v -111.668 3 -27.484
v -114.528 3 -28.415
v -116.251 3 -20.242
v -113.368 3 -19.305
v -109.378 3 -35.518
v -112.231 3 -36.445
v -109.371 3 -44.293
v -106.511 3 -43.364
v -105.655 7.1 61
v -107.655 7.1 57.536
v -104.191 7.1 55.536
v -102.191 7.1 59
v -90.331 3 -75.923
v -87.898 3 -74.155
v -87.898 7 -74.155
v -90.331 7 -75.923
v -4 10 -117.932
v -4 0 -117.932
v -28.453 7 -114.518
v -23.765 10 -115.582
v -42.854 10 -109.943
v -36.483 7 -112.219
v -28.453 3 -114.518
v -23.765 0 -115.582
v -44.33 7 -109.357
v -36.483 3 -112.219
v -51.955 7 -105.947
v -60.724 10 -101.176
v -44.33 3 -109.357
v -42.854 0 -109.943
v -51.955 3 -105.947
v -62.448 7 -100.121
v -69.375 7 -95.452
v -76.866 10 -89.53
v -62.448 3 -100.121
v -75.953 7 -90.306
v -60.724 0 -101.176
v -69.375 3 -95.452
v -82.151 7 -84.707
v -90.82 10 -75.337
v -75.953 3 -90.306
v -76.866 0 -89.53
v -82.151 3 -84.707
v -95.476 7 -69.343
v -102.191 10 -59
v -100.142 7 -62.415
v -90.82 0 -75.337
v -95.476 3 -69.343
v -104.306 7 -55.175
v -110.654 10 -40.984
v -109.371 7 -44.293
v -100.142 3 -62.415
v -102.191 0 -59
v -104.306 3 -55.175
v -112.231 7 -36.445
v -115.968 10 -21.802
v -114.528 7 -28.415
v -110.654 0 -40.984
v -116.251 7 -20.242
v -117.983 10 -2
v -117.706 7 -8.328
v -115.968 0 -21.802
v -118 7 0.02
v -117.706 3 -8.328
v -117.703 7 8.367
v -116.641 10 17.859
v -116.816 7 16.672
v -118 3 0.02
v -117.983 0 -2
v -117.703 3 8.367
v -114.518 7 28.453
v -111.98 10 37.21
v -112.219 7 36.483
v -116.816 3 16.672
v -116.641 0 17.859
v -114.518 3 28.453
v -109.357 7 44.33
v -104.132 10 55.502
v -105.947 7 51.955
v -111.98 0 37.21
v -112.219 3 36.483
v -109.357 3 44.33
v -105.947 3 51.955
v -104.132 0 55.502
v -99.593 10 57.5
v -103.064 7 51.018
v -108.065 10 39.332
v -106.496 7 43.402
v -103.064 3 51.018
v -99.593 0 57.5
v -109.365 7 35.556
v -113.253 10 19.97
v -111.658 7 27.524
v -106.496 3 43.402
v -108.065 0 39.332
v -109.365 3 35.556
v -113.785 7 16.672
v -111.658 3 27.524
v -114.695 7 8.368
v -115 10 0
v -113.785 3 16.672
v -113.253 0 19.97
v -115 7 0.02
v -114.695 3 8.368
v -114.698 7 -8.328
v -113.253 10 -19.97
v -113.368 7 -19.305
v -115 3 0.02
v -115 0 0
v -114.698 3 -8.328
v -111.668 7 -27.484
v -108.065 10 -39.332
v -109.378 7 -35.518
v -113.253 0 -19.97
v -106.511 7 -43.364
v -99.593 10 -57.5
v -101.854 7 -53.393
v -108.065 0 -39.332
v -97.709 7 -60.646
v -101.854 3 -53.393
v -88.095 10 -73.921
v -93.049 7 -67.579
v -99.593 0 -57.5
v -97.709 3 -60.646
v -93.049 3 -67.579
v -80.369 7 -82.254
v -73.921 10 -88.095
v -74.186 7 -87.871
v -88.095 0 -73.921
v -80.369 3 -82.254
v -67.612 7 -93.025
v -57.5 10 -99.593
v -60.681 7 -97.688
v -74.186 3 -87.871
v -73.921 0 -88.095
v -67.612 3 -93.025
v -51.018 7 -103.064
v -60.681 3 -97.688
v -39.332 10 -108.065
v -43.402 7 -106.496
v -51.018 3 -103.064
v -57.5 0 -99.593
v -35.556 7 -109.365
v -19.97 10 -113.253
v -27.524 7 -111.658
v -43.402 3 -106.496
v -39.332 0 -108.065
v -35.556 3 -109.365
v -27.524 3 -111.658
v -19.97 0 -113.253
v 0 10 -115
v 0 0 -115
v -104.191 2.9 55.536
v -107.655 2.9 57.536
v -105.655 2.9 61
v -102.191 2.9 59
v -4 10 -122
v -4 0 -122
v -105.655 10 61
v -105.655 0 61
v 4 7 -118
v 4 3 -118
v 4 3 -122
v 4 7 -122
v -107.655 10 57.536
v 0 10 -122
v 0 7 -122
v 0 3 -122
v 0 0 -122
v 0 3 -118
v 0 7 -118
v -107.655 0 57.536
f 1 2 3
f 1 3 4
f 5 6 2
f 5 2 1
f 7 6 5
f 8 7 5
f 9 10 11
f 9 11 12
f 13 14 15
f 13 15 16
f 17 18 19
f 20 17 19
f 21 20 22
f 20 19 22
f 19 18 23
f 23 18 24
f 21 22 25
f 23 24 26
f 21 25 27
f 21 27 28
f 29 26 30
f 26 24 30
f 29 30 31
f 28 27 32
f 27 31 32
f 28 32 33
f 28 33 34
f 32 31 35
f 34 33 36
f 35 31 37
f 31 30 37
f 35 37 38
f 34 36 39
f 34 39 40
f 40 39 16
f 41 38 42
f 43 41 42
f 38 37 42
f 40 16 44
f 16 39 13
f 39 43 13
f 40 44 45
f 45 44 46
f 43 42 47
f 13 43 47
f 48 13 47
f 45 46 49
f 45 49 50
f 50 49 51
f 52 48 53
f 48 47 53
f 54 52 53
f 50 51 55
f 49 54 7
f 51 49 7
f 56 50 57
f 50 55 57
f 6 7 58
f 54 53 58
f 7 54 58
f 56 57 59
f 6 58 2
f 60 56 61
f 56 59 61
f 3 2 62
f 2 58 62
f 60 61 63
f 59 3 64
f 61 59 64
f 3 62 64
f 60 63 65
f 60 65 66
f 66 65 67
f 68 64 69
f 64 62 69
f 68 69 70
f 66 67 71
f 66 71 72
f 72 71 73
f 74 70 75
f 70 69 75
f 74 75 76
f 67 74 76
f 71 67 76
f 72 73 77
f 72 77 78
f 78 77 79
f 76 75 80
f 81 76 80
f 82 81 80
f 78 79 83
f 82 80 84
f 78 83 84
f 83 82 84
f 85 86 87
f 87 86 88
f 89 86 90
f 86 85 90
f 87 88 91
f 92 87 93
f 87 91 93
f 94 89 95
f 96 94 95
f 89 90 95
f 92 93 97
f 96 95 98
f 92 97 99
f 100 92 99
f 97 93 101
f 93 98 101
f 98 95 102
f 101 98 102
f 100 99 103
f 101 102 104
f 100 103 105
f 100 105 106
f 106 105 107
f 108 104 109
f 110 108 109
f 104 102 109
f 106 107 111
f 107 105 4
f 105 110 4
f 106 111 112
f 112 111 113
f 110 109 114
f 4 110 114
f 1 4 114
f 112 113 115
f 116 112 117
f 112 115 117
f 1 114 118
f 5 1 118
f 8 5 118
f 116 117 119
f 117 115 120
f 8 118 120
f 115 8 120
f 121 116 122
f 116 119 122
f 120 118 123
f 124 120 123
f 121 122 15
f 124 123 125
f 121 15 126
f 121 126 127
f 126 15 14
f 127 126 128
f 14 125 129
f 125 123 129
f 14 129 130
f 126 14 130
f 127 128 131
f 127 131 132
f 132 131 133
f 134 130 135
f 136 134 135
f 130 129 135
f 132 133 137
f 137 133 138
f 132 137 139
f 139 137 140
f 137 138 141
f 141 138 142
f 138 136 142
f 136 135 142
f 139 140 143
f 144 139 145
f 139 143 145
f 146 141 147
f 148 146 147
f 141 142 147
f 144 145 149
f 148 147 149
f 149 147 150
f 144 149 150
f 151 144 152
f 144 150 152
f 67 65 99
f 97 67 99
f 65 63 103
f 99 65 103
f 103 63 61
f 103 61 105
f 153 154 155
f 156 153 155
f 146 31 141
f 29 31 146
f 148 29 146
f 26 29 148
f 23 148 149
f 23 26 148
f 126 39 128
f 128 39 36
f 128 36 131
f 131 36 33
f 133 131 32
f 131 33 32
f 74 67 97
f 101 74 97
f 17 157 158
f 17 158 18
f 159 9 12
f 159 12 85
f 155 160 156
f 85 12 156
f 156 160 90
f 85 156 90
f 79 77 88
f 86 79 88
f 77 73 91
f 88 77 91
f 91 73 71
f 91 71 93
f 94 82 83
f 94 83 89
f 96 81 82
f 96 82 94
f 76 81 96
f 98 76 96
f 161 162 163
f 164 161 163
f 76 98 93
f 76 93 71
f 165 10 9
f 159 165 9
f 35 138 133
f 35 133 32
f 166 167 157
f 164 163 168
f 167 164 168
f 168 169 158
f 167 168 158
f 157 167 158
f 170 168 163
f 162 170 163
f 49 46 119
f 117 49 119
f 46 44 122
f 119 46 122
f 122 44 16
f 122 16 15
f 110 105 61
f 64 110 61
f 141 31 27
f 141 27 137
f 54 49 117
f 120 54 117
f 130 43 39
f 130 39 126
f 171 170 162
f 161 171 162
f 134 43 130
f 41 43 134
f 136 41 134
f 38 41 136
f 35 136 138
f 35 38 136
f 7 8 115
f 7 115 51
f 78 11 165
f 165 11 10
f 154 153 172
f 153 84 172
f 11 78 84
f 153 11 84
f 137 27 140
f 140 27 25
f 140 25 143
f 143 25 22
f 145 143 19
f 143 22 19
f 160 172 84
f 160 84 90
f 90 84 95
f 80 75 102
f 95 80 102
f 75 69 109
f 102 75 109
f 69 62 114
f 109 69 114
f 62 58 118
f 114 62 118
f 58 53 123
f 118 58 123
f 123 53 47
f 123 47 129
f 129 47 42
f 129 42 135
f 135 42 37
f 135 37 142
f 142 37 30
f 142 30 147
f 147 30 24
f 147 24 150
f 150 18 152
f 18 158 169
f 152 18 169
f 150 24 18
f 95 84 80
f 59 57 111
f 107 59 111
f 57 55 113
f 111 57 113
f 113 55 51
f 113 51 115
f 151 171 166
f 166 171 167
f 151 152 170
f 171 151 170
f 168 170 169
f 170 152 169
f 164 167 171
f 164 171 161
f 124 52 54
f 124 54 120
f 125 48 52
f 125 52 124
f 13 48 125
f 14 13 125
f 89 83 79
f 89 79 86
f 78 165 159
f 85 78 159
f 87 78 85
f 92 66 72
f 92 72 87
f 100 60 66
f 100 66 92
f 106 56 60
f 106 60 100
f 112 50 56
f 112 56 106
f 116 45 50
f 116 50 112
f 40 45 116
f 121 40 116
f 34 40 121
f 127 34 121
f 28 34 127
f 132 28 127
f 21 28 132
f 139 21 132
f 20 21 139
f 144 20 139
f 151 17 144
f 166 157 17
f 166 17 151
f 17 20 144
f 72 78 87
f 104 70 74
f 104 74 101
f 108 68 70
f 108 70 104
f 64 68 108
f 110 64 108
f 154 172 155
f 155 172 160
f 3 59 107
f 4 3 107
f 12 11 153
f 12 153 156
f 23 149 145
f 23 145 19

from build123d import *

# Parameters (mm, degrees)
BOSS_EXTRUDE1_DEPTH     = 10
SKETCH2_W               = 8
SKETCH2_H               = 4.2
CUT_EXTRUDE1_DEPTH      = 4
CIRPATTERN4_START       = 3
CIRPATTERN4_DEPTH       = 4
CIRPATTERN4_2_OUTLINE_W = 4
CIRPATTERN4_2_OUTLINE_H = 4
CIRPATTERN4_2_DEPTH     = 4


# Read off the part's stored shape, not the designer's step: CirPattern4
with BuildPart() as part:
    # Sketch1 → Boss-Extrude1 (new body)
    with BuildSketch(Plane(origin=(0, 0, 0), x_dir=(1, 0, 0), z_dir=(0, 1, 0))):
        with BuildLine():
            Line((-4, 122), (-4, 117.932183902))
            ThreePointArc((-4, 117.932183902), (-102.190997647, 59), (-104.132267183, -55.501990336))
            Line((-104.132267183, -55.501990336), (-107.655099262, -57.535898385))
            Line((-107.655099262, -57.535898385), (-105.655099262, -61))
            Line((-105.655099262, -61), (-99.592921435, -57.5))
            ThreePointArc((-99.592921435, -57.5), (-99.592921435, 57.5), (0, 115))
            Line((0, 115), (0, 122))
            Line((0, 122), (-4, 122))
        make_face()
    extrude(amount=BOSS_EXTRUDE1_DEPTH)

    # Sketch2 → Cut-Extrude1 (cut)
    with BuildSketch(Plane(origin=(-105.655099262, 0, 61), x_dir=(0.4999999999999976, 0, 0.86602540378444), z_dir=(-0.8660254037844402, 0, 0.4999999999999977))):
        with Locations((0, 5)):
            Rectangle(SKETCH2_W, SKETCH2_H)
    extrude(amount=-CUT_EXTRUDE1_DEPTH, mode=Mode.SUBTRACT)

    # CirPattern4 outline → CirPattern4 (cut)
    with BuildSketch(Plane(origin=(0, 0, 0), x_dir=(1, 0, 0), z_dir=(0, 1, 0)).offset(CIRPATTERN4_START)):
        with BuildLine():
            ThreePointArc((-51.017828253, 103.063966547), (-39.505073194, 108.001616617), (-27.523562684, 111.657751622))
            Line((-27.523562684, 111.657751622), (-28.45299166, 114.518239882))
            ThreePointArc((-28.45299166, 114.518239882), (-40.431539839, 110.857072784), (-51.954522475, 105.946814933))
            Line((-51.954522475, 105.946814933), (-51.017828253, 103.063966547))
        make_face()
        with BuildLine():
            ThreePointArc((-80.369355178, 82.254281033), (-70.945892242, 90.507902273), (-60.680606447, 97.68758366))
            Line((-60.680606447, 97.68758366), (-62.448485416, 100.12086031))
            ThreePointArc((-62.448485416, 100.12086031), (-72.709398865, 92.93730853), (-82.151053465, 84.706578343))
            Line((-82.151053465, 84.706578343), (-80.369355178, 82.254281033))
        make_face()
        with BuildLine():
            ThreePointArc((-101.853769652, 53.392973393), (-95.442033049, 64.154643849), (-87.897809664, 74.15507438))
            Line((-87.897809664, 74.15507438), (-90.331086315, 75.922953349))
            ThreePointArc((-90.331086315, 75.922953349), (-97.869955334, 65.920192984), (-104.306066962, 55.17467168))
            Line((-104.306066962, 55.17467168), (-101.853769652, 53.392973393))
        make_face()
        with BuildLine():
            ThreePointArc((-113.368027495, 19.305189506), (-110.595642677, 31.521481894), (-106.510962851, 43.363749751))
            Line((-106.510962851, 43.363749751), (-109.371451112, 44.293178727))
            ThreePointArc((-109.371451112, 44.293178727), (-113.450318674, 32.450349656), (-116.250875881, 20.241883728))
            Line((-116.250875881, 20.241883728), (-113.368027495, 19.305189506))
        make_face()
        with BuildLine():
            ThreePointArc((-113.785032926, -16.672320837), (-114.923380235, -4.197222333), (-114.698080889, 8.327679163))
            Line((-114.698080889, 8.327679163), (-117.705776238, 8.327679163))
            ThreePointArc((-117.705776238, 8.327679163), (-117.925374368, -4.195959991), (-116.816239102, -16.672320837))
            Line((-116.816239102, -16.672320837), (-113.785032926, -16.672320837))
        make_face()
        with BuildLine():
            ThreePointArc((-103.063966547, -51.017828253), (-108.001616617, -39.505073194), (-111.657751621, -27.523562684))
            Line((-111.657751621, -27.523562684), (-114.518239882, -28.45299166))
            ThreePointArc((-114.518239882, -28.45299166), (-110.857072784, -40.431539839), (-105.946814933, -51.954522475))
            Line((-105.946814933, -51.954522475), (-103.063966547, -51.017828253))
        make_face()
    extrude(amount=CIRPATTERN4_DEPTH, mode=Mode.SUBTRACT)

    # CirPattern4 2 outline → CirPattern4 2 (add)
    with BuildSketch(Plane(origin=(0, 0, 0), x_dir=(1, 0, 0), z_dir=(0, 1, 0)).offset(CIRPATTERN4_START)):
        with Locations((2, 120)):
            Rectangle(CIRPATTERN4_2_OUTLINE_W, CIRPATTERN4_2_OUTLINE_H)
    extrude(amount=CIRPATTERN4_2_DEPTH)


solid = part.part
